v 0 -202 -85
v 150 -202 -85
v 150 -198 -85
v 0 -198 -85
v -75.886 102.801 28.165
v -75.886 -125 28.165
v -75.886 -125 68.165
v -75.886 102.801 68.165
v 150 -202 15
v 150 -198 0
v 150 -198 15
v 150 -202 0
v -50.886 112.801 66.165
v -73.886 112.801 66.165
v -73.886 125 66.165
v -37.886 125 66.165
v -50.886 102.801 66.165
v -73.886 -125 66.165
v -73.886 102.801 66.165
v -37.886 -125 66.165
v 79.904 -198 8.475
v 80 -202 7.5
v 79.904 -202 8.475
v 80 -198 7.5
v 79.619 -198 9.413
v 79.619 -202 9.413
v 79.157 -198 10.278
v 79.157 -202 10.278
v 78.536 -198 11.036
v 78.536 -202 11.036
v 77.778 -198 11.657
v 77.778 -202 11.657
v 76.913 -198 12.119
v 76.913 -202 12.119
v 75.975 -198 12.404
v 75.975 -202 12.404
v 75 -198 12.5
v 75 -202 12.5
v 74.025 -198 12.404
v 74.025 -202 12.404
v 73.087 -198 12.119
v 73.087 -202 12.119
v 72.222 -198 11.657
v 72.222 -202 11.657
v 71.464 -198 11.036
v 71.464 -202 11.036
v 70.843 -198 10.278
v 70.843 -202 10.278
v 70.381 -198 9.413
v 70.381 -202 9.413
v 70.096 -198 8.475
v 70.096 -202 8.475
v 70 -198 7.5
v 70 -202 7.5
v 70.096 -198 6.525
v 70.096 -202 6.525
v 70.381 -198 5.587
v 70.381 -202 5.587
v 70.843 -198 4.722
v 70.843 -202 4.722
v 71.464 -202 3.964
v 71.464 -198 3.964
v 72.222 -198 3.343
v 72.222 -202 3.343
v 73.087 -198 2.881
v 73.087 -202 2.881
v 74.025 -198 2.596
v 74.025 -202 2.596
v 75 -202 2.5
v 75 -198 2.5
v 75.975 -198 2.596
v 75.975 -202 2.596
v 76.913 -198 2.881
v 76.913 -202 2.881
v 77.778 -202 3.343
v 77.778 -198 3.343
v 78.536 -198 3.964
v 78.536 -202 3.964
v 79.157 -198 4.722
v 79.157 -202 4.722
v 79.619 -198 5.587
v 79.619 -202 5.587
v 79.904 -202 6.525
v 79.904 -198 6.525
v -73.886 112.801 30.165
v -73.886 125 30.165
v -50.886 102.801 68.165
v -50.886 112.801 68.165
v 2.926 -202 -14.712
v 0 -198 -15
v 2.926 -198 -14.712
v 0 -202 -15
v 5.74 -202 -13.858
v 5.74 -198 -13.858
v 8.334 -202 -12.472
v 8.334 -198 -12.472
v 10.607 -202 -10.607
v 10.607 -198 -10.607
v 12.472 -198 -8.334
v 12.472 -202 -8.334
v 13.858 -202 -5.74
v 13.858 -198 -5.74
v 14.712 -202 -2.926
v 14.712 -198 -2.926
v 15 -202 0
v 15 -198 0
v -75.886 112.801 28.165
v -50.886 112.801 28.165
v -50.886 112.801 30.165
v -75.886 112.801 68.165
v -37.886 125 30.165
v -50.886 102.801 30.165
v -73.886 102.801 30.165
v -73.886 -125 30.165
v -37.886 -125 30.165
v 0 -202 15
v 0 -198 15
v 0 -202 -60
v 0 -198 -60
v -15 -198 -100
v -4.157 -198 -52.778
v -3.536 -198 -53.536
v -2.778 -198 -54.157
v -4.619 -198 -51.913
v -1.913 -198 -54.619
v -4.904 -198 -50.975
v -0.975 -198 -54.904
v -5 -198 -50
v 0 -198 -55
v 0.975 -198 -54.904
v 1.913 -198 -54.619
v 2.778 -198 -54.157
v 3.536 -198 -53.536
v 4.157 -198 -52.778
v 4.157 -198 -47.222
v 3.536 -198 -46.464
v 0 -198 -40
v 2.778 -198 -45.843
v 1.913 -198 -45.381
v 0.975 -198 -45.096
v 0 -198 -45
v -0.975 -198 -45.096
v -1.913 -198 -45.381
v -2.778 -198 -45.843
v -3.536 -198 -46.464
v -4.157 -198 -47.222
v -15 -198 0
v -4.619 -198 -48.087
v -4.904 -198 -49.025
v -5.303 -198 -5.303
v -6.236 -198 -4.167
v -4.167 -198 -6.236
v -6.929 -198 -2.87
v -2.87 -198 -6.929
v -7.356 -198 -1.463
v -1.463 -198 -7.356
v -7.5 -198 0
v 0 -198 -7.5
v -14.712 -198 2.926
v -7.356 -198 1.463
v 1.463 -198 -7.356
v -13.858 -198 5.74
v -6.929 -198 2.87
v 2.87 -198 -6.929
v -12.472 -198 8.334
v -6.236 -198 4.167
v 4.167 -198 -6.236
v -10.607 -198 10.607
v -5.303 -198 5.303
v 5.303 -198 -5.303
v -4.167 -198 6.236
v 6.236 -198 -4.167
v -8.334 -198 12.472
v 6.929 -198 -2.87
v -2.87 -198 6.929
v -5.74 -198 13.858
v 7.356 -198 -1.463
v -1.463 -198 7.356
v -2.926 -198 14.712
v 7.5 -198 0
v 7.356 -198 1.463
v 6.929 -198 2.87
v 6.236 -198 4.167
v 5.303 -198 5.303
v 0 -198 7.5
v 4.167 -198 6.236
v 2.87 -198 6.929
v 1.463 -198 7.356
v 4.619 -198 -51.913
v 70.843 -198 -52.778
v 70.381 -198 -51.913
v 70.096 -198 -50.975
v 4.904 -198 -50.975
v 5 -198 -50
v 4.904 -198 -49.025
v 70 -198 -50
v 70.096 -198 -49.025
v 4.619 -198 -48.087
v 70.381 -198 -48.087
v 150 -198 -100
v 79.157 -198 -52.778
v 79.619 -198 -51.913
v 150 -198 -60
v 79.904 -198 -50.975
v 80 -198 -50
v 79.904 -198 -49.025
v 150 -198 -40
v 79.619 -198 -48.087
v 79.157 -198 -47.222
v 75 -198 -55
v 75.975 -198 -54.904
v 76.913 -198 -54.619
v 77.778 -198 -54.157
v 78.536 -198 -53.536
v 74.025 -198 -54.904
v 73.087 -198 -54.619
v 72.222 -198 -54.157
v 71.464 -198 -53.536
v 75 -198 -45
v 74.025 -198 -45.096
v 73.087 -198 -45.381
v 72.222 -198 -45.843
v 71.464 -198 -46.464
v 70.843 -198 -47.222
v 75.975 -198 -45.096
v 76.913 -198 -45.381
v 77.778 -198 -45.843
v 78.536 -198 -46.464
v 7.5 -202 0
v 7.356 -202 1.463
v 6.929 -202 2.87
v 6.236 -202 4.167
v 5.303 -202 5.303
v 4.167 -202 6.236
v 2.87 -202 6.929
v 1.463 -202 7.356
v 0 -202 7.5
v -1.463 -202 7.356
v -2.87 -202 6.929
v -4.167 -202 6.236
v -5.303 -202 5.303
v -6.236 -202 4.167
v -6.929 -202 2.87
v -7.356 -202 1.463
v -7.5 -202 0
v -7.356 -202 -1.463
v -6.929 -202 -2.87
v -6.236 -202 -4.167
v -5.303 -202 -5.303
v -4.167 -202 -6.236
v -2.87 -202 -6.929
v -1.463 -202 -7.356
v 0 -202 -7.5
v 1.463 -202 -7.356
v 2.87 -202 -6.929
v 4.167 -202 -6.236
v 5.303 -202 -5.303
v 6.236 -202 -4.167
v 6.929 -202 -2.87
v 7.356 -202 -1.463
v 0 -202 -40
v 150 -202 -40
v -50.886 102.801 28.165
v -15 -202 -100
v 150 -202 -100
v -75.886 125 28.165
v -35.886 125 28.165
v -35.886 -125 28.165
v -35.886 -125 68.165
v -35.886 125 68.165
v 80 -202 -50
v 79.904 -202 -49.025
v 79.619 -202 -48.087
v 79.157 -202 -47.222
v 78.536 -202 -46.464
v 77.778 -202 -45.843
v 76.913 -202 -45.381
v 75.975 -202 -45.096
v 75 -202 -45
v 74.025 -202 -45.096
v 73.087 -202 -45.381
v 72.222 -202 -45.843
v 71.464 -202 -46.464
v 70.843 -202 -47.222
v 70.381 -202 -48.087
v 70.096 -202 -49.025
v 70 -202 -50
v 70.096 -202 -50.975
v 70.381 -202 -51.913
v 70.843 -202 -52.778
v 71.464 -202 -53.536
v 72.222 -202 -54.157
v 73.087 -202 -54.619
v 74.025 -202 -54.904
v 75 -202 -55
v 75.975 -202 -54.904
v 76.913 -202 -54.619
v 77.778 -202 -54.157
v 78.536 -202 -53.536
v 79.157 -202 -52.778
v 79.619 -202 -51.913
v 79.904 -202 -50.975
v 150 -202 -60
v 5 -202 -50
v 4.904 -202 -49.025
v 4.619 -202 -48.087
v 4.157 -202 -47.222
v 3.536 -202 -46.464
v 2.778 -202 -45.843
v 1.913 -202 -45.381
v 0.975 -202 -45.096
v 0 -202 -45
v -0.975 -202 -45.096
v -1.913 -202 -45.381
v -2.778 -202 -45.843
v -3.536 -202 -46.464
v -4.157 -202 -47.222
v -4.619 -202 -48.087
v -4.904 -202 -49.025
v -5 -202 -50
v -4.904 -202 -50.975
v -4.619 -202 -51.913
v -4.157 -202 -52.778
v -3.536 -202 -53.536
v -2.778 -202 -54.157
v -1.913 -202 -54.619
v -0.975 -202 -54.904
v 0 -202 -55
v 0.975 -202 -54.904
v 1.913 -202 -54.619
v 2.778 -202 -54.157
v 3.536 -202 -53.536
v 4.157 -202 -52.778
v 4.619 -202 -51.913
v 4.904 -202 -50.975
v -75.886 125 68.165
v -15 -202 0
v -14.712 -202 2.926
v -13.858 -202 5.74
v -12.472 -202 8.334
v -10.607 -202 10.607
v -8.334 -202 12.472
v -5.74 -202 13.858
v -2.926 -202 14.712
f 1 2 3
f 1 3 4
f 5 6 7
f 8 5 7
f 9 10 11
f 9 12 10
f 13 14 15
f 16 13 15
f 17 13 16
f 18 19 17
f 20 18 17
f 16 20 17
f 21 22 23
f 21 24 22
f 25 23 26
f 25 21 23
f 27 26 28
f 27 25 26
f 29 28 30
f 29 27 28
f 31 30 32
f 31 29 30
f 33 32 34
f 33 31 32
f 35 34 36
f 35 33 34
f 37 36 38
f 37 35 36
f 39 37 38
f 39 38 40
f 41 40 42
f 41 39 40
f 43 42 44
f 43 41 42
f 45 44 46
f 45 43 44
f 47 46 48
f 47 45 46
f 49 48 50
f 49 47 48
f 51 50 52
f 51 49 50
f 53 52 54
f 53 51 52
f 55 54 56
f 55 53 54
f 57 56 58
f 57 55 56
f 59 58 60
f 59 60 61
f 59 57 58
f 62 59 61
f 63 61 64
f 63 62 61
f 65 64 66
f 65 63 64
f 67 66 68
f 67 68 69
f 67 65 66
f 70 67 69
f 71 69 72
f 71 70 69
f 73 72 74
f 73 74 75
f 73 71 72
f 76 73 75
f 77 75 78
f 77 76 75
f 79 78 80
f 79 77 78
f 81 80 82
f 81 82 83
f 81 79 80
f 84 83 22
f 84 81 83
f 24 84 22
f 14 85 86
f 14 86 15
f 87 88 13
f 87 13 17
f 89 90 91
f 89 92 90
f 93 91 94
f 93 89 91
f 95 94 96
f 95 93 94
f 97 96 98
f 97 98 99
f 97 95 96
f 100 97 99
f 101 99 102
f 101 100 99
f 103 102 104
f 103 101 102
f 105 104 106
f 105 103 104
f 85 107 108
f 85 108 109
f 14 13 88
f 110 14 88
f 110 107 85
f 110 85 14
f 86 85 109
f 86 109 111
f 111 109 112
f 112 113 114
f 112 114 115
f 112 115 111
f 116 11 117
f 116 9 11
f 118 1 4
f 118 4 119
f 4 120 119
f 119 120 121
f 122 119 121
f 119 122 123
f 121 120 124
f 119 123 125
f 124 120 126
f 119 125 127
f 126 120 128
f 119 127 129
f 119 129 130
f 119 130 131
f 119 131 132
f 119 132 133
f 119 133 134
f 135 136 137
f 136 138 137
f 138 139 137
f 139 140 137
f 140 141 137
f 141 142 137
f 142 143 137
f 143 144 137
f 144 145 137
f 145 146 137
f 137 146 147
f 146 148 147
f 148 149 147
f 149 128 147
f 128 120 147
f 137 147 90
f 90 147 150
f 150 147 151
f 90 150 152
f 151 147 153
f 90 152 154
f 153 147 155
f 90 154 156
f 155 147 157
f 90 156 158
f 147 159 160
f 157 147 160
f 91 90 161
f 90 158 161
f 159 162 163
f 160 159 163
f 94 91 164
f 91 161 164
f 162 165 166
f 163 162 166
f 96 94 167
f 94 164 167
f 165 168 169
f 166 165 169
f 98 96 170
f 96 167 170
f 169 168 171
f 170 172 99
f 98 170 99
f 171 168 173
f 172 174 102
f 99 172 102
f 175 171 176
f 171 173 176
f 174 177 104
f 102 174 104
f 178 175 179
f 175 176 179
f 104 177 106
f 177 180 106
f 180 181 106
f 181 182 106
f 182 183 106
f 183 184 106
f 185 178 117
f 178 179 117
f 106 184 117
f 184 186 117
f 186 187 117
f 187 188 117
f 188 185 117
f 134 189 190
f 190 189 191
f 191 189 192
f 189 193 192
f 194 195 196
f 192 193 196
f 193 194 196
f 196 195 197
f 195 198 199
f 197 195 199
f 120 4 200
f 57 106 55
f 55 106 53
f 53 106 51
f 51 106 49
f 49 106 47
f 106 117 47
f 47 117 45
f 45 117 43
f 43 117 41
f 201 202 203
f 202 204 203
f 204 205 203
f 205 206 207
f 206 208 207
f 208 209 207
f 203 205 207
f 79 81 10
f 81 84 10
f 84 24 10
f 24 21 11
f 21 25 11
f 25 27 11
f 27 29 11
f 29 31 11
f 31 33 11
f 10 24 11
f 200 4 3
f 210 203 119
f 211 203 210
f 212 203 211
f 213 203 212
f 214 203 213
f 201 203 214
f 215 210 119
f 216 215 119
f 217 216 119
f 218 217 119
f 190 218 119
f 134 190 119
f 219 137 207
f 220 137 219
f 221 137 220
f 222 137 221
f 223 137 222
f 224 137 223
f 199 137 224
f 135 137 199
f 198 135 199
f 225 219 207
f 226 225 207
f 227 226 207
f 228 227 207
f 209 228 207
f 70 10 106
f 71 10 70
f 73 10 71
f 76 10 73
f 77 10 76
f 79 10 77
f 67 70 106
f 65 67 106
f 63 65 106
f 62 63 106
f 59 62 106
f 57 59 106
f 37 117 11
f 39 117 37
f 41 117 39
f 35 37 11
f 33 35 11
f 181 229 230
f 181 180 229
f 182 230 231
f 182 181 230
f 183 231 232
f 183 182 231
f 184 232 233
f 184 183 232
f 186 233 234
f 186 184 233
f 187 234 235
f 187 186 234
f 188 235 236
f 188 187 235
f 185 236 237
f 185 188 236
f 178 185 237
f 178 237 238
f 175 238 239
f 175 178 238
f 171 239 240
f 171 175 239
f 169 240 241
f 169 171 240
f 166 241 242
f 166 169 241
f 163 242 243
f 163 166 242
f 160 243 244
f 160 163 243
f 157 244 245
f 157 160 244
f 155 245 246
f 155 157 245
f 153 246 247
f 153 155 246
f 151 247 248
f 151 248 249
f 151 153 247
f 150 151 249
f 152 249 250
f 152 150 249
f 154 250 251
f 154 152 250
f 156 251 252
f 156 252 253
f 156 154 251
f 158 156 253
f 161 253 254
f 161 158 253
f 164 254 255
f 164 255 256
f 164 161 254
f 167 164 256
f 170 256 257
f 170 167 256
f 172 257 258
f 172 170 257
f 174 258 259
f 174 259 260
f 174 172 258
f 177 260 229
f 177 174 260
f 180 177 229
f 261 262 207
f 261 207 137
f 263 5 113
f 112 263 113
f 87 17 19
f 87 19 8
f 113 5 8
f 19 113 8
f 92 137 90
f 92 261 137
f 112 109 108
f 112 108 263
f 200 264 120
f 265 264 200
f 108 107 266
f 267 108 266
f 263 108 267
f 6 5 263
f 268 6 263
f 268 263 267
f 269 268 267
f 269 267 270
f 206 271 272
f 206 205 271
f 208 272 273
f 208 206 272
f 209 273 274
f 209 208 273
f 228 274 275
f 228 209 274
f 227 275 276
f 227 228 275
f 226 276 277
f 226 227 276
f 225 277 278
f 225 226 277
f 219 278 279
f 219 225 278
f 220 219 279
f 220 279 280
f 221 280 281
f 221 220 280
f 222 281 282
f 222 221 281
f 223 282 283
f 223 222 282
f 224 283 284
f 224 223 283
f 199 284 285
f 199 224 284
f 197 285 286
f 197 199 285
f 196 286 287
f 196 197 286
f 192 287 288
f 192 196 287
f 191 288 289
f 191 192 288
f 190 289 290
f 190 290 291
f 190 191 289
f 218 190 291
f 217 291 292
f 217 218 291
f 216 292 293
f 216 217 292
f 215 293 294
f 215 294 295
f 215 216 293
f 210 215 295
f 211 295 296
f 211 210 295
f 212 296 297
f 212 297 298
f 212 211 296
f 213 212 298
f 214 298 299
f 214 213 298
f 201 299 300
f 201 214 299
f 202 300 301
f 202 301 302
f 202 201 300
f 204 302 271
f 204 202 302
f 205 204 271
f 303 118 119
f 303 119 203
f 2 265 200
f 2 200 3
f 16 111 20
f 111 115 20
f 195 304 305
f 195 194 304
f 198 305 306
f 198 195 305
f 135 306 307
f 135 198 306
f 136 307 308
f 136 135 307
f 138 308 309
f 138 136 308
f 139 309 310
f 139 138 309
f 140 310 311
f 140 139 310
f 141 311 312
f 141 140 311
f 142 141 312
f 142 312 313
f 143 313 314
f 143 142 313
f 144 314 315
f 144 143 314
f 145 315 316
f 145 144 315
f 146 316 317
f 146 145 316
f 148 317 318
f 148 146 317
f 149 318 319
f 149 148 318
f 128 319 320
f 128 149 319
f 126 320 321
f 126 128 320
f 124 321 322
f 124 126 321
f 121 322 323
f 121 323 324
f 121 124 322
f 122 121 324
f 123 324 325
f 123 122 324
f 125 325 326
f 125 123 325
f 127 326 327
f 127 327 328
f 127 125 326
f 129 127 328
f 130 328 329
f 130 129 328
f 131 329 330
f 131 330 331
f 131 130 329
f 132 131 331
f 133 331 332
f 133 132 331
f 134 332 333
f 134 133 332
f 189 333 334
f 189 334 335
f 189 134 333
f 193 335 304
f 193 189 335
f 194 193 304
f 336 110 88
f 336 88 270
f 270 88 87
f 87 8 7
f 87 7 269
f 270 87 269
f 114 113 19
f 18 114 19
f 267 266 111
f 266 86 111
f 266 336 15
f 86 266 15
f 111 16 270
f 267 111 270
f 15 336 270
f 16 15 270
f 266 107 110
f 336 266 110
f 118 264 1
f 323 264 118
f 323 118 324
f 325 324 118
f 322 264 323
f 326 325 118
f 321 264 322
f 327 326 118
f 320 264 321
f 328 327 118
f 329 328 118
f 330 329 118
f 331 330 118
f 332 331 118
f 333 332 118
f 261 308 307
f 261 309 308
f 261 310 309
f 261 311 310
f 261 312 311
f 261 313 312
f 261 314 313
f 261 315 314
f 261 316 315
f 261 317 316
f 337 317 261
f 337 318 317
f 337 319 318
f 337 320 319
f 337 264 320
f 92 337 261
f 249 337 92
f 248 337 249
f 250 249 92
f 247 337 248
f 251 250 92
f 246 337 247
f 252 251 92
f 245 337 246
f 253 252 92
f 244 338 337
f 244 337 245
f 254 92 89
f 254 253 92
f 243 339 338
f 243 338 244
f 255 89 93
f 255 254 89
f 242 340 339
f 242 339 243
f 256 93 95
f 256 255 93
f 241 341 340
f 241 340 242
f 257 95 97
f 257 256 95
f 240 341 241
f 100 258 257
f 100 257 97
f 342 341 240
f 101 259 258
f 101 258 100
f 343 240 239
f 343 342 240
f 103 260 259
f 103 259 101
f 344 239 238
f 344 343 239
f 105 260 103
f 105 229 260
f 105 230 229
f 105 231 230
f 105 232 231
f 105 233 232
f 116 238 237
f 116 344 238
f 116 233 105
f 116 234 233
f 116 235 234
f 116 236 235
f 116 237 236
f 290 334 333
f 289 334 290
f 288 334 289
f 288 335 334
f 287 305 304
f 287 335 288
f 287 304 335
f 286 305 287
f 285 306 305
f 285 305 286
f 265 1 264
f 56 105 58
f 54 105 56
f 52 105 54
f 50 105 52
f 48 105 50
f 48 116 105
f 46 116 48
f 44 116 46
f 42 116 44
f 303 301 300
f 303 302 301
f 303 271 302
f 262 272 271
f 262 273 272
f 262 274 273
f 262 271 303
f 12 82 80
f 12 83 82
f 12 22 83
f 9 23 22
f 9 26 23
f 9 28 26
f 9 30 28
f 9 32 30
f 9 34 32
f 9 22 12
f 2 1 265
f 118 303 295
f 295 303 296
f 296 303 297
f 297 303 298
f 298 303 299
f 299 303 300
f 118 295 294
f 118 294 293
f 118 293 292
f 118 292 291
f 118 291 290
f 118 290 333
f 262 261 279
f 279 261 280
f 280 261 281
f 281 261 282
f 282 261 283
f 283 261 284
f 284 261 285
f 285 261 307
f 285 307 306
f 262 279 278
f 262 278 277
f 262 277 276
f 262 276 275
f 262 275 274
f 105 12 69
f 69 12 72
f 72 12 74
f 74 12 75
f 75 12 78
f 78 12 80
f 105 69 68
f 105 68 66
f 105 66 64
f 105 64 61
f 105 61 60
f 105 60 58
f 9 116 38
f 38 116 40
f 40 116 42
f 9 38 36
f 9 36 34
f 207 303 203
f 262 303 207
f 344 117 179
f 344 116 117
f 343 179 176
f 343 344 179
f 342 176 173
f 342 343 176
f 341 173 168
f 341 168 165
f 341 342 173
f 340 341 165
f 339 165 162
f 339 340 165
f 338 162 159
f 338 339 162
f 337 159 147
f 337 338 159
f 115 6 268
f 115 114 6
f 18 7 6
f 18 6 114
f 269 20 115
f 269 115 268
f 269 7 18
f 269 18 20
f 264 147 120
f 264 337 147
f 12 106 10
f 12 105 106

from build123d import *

# Parameters (mm, degrees)
F2_R     = 5
F2_R_2   = 7.5
F3_DEPTH = 2
F4_W     = 40
F4_H     = 40
F4_W_2   = 36
F4_H_2   = 36
F5_DEPTH = 125
F6_W     = 10
F6_H     = 100.0105524436
F7_DEPTH = 25


with BuildPart() as f3:
    # F2 (on offset) → F3 (new body, symmetric)
    with BuildSketch(Plane.XZ.offset(200)):
        with BuildLine():
            Line((-15, 0), (-15, -100))
            Line((-15, -100), (150, -100))
            Line((150, -100), (150, -85))
            Line((150, -85), (0, -85))
            Line((0, -85), (0, -60))
            Line((0, -60), (150, -60))
            Line((150, -60), (150, -40))
            Line((150, -40), (0, -40))
            Line((0, -40), (0, -15))
            ThreePointArc((0, -15), (10.6066017178, -10.6066017178), (15, 0))
            Line((15, 0), (150, 0))
            Line((150, 0), (150, 15))
            Line((150, 15), (0, 15))
            ThreePointArc((0, 15), (-10.6066017178, 10.6066017178), (-15, 0))
        make_face()
        with Locations((0, -50)):
            Circle(F2_R, mode=Mode.SUBTRACT)
        with Locations((75, -50)):
            Circle(F2_R, mode=Mode.SUBTRACT)
        Circle(F2_R_2, mode=Mode.SUBTRACT)
        with Locations((75, 7.5)):
            Circle(F2_R, mode=Mode.SUBTRACT)
    extrude(amount=F3_DEPTH, both=True)


with BuildPart() as f5:
    # F4 (on Front) → F5 (new body, symmetric)
    with BuildSketch(Plane.XZ):
        with Locations((-55.8856502175, 48.1647402048)):
            Rectangle(F4_W, F4_H)
        with Locations((-55.8856502175, 48.1647402048)):
            Rectangle(F4_W_2, F4_H_2, mode=Mode.SUBTRACT)
    extrude(amount=F5_DEPTH, both=True)

    # F6 (on face) → F7 (cut)
    with BuildSketch(Plane(origin=(-75.8856502175, 0, 0), x_dir=(0, -1, 0), z_dir=(-1, 0, 0))):
        with Locations((-107.8009057045, 61.1586305313)):
            Rectangle(F6_W, F6_H)
    extrude(amount=-F7_DEPTH, mode=Mode.SUBTRACT)


solid = Compound([f3.part, f5.part])
